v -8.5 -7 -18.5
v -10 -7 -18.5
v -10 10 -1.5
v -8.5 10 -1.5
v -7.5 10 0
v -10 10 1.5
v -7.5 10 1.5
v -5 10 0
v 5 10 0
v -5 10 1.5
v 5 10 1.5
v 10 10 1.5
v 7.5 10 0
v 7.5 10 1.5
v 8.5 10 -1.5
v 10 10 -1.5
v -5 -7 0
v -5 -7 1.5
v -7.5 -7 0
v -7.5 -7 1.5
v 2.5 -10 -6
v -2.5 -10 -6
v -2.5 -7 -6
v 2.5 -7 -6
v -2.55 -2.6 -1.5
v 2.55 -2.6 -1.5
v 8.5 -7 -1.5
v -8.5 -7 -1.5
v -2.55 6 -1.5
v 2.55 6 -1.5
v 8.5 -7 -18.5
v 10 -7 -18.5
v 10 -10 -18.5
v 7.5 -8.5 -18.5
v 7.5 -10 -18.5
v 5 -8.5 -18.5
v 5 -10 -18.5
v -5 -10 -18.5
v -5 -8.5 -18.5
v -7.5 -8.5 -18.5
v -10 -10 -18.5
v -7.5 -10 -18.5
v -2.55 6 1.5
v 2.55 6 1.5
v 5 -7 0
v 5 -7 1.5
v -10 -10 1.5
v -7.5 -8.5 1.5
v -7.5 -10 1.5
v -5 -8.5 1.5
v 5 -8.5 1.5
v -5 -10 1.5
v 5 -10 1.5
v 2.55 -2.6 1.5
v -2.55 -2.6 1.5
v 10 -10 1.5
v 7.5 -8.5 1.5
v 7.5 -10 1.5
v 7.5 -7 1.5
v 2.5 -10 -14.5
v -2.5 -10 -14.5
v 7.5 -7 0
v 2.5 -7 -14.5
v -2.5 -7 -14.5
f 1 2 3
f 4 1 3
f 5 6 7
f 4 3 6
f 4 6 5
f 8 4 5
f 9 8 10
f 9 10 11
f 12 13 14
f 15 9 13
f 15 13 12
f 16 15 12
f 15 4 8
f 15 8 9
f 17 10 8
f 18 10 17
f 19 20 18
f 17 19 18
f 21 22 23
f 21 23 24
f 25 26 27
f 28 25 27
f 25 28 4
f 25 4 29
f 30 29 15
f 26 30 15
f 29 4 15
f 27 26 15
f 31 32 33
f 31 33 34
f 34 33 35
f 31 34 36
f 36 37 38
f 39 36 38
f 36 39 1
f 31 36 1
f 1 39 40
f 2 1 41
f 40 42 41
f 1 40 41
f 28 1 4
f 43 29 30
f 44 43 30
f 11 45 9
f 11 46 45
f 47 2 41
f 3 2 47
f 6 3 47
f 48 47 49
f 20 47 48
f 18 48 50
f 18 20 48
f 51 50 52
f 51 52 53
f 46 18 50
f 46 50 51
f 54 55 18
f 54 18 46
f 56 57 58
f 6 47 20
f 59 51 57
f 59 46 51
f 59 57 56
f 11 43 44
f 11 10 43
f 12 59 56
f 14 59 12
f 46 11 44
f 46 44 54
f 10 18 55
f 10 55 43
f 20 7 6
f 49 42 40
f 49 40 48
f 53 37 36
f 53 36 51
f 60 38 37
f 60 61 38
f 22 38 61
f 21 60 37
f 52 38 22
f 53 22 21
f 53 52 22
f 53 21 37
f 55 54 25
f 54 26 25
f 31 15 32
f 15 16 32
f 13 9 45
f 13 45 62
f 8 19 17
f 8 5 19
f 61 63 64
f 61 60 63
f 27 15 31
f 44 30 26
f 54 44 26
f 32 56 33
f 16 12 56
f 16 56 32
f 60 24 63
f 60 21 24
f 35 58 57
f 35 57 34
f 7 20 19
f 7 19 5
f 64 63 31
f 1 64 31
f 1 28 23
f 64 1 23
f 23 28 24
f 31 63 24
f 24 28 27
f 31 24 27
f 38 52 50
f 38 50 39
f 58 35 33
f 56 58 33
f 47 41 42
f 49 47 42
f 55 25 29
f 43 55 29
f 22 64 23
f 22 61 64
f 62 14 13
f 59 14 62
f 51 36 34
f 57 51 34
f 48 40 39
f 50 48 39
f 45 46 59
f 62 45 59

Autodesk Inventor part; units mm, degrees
sketch "Boceto1" plane through (0, 0, 0) normal (0, 0, 1) x (1, 0, 0)
  line L0 (10, -10) -> (-10, -10)
  line L1 (-10, -10) -> (-10, 10)
  line L2 (-10, 10) -> (10, 10)
  line L3 (10, 10) -> (10, -10)
  line L4 (10, -10) -> (-10, 10) construction
  line L5 (-10, -10) -> (10, 10) construction
  line L6 (2.55, 6) -> (-2.55, 6) construction
  line L7 (-2.55, 6) -> (2.55, 6)
  line L8 (2.55, 6) -> (2.55, -2.6)
  line L9 (2.55, -2.6) -> (-2.55, -2.6)
  line L10 (-2.55, -2.6) -> (-2.55, 6)
  point P0 (0, 0)
  point P1 (0, 6)
  dimension "d0" = 20
  dimension "d1" = 4
  dimension "d2" = 5.1
  dimension "d3" = 8.6
extrude "Extrusión1" add sketch "Boceto1" along normal mid plane 3
sketch "Boceto2" plane through (0, 0, 1.5) normal (0, 0, 1) x (1, 0, 0)
  line L0 (10, 10) -> (-10, 10) projected
  line L1 (-10, -10) -> (10, -10) projected
  line L2 (-7.5, 10) -> (-5, 10)
  line L3 (-5, 10) -> (-5, -10)
  line L4 (-5, -10) -> (-7.5, -10)
  line L5 (-7.5, -10) -> (-7.5, 10)
  line L6 (5, 10) -> (7.5, 10)
  line L7 (7.5, 10) -> (7.5, -10)
  line L8 (7.5, -10) -> (5, -10)
  line L9 (5, -10) -> (5, 10)
  line L10 (0, -14) -> (0, 14) projected
  point P0 (0, 0)
  point P1 (-5, 10)
  point P2 (5, -10)
  dimension "d6" = 2.5
  dimension "d7" = 5
extrude "Extrusión2" cut sketch "Boceto2" against normal blind 1.5 contours L7 L1 L9 L0 | L3 L1 L5 L0
sketch "Boceto5" plane through (-10, -10, -1.5) normal (0, -1, 0) x (1, 0, 0)
  line L0 (20, -17) -> (0, -17)
  line L1 (0, -17) -> (0, 3)
  line L2 (0, 3) -> (20, 3)
  line L3 (20, 3) -> (20, -17)
  line L4 (20, -17) -> (0, 3) construction
  line L5 (0, -17) -> (20, 3) construction
  line L6 (12.5, -4.5) -> (7.5, -4.5) construction
  line L7 (7.5, -4.5) -> (12.5, -4.5)
  line L8 (12.5, -4.5) -> (12.5, -13)
  line L9 (12.5, -13) -> (7.5, -13)
  line L10 (7.5, -13) -> (7.5, -4.5)
  point P0 (10, 1.5)
  point P1 (10, -7)
  point P2 (10, -4.5)
  dimension "d12" = 20
  dimension "d14" = 5
  dimension "d15" = 8.5
  dimension "d16" = 4
extrude "Extrusión3" add sketch "Boceto5" against normal blind 3
sketch "Boceto6" plane through (-10, -10, 1.5) normal (0, -1, 0) x (1, 0, 0)
  line L0 (0, -20) -> (20, -20) projected
  line L1 (15, 0) -> (5, 0) projected
  line L2 (17.5, -20) -> (15, -20)
  line L3 (15, -20) -> (15, 0)
  line L4 (15, 0) -> (17.5, 0)
  line L5 (17.5, 0) -> (17.5, -20)
  line L6 (7.5, -7.5) -> (12.5, -7.5) projected
  line L7 (2.5, 0) -> (5, 0) projected
  line L8 (5, -20) -> (2.5, -20)
  line L9 (2.5, -20) -> (2.5, 0)
  line L10 (2.5, 0) -> (5, 0)
  line L11 (5, 0) -> (5, -20)
  line L12 (10, -24) -> (10, 4) projected
  point P0 (10, -1.5)
  point P1 (10, -7.5)
  point P2 (10, -7.5)
  point P3 (2.5, -20)
  dimension "d19" = 2.5
  dimension "d20" = 5
extrude "Extrusión4" cut sketch "Boceto6" against normal blind 1.5 contours L9 L7 L11 L0 | L3 L4 L5 L0
sketch "Boceto7" plane through (10, -10, 1.5) normal (1, 0, 0) x (0, 0, -1)
  line L0 (0, 20) -> (3, 20) projected
  line L1 (20, 0) -> (20, 3) projected
  line L2 (3, 20) -> (20, 3)
  line L3 (20, 3) -> (3, 3)
  line L4 (3, 3) -> (3, 20)
  point P0 (1.5, 10)
extrude "Extrusión5" add sketch "Boceto7" against normal blind 1.5
mirror "Simetría1" about plane through (0, 0, 0) normal (1, 0, 0) of "Extrusión5"
properties part number "Soporte_2020_0001"
